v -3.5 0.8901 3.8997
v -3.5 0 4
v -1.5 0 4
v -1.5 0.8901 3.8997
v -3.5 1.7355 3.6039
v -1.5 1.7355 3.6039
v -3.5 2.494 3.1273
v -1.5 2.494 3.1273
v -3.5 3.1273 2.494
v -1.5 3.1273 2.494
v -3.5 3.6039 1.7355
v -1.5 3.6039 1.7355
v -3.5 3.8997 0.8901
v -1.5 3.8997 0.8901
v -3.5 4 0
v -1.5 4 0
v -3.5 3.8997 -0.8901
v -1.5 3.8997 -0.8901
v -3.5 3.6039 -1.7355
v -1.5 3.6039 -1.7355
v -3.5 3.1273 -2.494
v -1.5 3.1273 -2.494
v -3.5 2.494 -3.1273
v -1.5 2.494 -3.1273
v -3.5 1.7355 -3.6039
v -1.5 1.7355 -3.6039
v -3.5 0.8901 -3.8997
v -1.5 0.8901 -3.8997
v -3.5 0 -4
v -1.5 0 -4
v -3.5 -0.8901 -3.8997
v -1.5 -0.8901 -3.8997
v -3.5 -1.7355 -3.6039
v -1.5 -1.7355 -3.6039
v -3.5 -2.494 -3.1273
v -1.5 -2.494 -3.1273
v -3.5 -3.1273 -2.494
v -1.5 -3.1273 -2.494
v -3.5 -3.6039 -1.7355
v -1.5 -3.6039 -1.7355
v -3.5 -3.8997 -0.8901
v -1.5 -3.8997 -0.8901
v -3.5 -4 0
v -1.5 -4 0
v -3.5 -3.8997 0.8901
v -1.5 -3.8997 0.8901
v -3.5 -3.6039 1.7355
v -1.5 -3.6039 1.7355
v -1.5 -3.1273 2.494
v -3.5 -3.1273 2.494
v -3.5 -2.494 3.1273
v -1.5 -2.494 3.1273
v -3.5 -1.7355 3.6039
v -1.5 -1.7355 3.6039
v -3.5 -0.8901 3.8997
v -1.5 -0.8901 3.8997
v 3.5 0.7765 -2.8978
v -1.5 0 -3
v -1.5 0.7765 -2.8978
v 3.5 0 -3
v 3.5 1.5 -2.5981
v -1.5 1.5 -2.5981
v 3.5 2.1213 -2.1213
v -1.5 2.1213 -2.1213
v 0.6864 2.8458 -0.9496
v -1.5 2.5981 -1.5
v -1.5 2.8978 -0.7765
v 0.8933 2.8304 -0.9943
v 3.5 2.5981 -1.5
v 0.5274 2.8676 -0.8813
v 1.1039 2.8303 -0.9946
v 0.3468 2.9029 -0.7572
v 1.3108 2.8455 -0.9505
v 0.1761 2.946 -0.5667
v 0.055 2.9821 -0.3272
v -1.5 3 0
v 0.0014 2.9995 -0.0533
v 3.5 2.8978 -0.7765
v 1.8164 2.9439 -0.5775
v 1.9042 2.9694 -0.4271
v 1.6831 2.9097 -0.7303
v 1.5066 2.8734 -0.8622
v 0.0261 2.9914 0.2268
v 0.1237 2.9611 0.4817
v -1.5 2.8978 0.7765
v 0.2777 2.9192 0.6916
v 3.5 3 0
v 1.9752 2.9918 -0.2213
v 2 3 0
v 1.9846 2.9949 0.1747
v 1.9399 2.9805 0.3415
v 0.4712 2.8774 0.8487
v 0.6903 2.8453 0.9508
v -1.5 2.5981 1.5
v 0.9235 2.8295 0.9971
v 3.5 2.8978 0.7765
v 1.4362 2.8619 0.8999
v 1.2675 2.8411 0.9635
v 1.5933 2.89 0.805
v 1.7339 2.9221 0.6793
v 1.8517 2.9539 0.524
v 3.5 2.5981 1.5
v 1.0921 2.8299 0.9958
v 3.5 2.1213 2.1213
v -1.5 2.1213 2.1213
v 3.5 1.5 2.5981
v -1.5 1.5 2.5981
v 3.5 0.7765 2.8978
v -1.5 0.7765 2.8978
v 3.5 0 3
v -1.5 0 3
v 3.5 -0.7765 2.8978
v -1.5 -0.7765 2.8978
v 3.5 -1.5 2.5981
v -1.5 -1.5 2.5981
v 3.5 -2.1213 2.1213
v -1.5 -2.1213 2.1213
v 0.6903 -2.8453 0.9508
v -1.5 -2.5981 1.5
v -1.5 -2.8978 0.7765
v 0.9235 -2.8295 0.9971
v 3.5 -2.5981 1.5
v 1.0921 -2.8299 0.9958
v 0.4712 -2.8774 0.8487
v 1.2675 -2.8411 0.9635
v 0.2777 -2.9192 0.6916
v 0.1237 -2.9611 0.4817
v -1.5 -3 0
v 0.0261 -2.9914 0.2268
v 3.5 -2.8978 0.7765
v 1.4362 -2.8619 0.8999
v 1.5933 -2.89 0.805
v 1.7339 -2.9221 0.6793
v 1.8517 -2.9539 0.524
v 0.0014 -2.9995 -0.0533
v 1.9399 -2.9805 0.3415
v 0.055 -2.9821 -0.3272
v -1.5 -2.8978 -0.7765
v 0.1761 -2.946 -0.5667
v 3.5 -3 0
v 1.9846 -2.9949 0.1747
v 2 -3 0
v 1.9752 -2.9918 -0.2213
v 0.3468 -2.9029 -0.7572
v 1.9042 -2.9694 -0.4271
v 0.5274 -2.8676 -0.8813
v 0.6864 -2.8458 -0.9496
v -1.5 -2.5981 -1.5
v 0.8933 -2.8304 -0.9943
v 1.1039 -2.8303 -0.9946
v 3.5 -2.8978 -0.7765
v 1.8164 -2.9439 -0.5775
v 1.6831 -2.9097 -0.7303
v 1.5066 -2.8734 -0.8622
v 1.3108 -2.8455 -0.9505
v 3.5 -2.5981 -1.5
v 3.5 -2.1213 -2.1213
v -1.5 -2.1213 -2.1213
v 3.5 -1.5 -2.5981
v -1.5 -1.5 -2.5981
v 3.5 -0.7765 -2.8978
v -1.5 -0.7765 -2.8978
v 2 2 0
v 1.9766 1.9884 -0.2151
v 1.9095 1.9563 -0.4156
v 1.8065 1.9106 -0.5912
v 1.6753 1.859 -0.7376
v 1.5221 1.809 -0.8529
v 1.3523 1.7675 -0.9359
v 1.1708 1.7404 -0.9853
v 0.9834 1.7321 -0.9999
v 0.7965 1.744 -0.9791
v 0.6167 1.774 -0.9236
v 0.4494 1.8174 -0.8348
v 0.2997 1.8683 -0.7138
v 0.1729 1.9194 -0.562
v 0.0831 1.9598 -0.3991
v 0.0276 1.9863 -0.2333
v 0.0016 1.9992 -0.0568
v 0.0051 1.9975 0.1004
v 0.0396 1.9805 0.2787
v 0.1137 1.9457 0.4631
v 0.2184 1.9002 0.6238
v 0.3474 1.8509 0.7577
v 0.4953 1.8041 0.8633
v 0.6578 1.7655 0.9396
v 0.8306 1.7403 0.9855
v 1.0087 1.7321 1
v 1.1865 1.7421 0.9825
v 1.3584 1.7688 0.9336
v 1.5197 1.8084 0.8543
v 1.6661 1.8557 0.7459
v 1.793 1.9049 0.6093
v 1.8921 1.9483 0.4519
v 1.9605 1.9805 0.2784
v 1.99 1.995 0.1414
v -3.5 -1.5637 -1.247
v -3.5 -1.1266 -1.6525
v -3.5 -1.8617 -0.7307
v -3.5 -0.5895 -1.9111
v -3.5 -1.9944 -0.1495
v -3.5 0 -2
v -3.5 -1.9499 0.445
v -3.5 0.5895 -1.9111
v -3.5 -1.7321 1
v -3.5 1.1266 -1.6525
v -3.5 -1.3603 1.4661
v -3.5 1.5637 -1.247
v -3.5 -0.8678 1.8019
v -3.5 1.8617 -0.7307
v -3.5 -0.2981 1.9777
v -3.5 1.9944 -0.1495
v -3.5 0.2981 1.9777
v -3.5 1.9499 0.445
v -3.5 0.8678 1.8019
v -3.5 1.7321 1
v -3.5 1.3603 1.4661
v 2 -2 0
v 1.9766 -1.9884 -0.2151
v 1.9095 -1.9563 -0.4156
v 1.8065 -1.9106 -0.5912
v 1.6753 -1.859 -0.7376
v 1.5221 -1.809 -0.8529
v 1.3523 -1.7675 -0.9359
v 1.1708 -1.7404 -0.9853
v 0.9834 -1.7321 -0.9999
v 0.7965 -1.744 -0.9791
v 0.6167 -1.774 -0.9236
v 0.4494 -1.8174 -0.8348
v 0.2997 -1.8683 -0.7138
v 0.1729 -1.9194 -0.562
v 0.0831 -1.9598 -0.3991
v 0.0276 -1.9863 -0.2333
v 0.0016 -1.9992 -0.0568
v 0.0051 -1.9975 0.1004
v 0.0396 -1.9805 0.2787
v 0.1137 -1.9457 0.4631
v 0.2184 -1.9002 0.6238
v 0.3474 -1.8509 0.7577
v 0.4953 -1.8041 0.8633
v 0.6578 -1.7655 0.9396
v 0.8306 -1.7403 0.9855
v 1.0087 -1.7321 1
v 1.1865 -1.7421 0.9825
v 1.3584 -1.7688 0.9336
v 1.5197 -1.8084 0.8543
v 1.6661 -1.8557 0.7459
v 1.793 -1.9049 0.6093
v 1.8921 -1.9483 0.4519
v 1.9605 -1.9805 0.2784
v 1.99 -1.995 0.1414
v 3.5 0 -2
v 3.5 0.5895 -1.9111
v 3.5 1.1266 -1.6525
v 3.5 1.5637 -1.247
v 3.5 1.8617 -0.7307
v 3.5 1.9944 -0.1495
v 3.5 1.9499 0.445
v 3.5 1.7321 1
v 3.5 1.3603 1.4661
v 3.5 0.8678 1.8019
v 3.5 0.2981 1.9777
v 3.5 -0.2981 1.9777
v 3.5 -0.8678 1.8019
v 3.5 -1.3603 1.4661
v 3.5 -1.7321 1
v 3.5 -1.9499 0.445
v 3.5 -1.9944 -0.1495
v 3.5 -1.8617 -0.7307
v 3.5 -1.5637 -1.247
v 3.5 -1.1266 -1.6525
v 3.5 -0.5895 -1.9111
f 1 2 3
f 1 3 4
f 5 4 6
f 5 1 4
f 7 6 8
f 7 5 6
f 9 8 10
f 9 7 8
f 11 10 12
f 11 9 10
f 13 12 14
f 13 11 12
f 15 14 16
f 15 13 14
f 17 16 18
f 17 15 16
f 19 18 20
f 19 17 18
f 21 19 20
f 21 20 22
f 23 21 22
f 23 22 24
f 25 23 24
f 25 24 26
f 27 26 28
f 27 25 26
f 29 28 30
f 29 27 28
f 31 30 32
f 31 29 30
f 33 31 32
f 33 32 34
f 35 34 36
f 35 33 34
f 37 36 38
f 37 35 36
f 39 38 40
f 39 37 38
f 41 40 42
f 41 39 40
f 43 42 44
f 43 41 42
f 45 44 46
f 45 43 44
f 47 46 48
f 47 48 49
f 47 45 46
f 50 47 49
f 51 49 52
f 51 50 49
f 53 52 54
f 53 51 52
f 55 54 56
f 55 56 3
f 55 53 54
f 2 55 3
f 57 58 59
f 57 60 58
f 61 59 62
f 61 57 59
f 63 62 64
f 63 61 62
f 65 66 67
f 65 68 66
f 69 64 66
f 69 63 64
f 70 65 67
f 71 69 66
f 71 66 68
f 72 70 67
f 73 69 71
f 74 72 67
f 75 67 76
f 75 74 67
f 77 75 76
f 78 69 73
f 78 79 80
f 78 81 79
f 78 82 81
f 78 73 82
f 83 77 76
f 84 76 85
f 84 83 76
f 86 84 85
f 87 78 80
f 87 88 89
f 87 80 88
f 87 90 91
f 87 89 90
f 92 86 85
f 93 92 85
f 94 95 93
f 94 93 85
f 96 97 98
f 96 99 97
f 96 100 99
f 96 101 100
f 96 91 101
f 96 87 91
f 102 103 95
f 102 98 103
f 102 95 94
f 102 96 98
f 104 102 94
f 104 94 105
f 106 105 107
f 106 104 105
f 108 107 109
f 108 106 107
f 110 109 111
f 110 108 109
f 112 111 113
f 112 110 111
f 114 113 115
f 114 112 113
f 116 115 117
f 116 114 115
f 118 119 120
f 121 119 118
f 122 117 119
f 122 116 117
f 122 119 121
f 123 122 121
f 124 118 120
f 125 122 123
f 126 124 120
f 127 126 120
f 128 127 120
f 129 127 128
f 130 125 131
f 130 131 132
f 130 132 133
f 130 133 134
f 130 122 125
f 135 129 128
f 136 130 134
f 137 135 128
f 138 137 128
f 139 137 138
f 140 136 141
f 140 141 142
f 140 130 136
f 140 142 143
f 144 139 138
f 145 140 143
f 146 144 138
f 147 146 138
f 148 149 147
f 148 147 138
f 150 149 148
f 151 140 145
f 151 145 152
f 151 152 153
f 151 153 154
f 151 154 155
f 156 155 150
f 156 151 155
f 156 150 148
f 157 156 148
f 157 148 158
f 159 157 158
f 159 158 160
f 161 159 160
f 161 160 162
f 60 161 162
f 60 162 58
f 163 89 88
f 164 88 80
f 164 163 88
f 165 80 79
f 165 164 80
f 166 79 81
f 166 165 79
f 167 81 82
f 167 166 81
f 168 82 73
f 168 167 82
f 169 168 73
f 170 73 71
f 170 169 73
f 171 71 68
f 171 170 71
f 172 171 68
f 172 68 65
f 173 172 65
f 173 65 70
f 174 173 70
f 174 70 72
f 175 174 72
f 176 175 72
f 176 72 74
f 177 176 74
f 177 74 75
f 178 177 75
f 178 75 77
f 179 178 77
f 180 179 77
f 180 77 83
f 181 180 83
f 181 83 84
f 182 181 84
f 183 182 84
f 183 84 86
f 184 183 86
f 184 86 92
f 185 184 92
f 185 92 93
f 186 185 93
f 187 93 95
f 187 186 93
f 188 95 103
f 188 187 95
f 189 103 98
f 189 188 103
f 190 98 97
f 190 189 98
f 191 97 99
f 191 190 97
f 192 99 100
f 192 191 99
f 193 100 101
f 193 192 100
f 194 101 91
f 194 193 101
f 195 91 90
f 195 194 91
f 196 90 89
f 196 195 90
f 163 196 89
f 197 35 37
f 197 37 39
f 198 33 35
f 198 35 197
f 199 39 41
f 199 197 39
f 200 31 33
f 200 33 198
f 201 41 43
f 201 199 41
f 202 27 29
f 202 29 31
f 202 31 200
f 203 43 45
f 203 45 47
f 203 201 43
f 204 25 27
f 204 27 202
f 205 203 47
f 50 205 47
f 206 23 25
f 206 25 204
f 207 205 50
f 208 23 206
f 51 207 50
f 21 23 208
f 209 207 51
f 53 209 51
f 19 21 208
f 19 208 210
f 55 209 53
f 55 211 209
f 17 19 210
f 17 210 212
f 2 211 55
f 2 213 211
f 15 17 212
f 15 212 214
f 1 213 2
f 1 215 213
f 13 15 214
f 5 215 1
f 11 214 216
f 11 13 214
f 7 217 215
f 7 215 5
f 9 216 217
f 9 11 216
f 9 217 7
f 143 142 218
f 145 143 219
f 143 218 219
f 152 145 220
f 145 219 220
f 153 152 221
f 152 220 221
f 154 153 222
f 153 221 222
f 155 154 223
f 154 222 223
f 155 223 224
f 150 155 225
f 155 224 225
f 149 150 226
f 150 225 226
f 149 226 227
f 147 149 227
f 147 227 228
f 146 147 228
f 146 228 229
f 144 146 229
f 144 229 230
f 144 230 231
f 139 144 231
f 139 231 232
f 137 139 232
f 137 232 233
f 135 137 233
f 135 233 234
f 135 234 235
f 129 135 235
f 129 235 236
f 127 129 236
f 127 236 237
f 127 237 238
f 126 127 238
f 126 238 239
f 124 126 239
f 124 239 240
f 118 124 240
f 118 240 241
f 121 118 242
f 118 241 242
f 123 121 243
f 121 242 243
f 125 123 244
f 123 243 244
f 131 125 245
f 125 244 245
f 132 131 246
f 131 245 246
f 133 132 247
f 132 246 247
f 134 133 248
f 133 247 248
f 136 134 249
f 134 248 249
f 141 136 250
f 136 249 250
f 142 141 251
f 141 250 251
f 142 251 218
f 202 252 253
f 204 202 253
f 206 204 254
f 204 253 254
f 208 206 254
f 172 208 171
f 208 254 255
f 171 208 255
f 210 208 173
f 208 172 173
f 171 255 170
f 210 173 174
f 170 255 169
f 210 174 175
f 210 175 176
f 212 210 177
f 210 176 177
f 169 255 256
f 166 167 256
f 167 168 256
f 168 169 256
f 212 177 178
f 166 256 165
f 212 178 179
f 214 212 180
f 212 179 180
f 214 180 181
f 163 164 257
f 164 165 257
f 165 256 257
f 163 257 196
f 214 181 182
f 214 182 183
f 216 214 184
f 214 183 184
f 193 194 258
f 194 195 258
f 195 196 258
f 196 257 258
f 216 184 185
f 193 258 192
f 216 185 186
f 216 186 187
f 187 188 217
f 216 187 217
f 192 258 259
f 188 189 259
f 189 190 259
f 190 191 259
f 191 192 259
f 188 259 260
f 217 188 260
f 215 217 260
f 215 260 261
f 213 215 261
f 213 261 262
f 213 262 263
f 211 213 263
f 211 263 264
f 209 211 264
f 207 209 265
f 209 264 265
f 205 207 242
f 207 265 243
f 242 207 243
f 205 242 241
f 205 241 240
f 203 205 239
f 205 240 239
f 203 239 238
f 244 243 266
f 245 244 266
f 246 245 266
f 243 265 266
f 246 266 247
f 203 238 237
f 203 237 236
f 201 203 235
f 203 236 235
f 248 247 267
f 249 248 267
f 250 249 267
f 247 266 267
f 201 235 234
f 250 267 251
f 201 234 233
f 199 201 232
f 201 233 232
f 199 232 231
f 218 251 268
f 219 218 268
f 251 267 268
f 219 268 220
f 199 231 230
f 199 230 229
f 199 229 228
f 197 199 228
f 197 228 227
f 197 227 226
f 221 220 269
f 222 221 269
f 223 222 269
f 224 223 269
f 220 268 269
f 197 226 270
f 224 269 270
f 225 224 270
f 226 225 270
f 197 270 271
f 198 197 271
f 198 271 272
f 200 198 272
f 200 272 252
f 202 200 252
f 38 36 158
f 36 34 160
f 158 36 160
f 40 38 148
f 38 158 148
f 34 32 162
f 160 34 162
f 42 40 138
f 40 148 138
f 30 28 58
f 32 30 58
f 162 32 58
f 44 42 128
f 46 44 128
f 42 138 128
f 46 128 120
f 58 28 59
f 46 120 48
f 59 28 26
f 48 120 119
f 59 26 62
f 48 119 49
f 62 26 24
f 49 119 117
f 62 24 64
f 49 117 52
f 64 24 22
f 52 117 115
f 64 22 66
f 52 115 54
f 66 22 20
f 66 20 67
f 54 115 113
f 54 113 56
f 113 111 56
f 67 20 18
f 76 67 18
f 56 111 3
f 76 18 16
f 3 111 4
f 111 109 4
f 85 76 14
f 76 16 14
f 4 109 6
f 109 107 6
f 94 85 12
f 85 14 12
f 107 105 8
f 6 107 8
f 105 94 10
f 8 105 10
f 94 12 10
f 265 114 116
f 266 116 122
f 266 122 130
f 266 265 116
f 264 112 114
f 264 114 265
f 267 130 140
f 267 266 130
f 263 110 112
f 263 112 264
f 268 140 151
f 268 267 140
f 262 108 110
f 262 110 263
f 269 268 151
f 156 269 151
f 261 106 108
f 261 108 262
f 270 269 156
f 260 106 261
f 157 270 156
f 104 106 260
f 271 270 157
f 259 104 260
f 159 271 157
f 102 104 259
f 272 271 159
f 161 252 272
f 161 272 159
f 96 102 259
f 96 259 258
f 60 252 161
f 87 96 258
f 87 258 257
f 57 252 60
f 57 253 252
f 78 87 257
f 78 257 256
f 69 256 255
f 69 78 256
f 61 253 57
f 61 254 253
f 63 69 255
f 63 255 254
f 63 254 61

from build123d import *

# Parameters (mm, degrees)
SKETCH1_R               = 3
BOSS_EXTRUDE1_DEPTH     = 3.5
SKETCH2_R               = 4
BOSS_EXTRUDE2_DEPTH     = 2
SKETCH3_R               = 2
CUT_EXTRUDE1_DEPTH      = 8
SKETCH4_R               = 1
CUT_EXTRUDE2_DEPTH      = 5
CUT_EXTRUDE2_DEPTH_BACK = 5


with BuildPart() as part:
    # Sketch1 → Boss-Extrude1 (new body, symmetric)
    with BuildSketch(Plane(origin=(0, 0, 0), x_dir=(0, 0, -1), z_dir=(1, 0, 0))):
        Circle(SKETCH1_R)
    extrude(amount=BOSS_EXTRUDE1_DEPTH, both=True)

    # Sketch2 → Boss-Extrude2 (add)
    with BuildSketch(Plane.ZY.offset(3.5)):
        Circle(SKETCH2_R)
    extrude(amount=-BOSS_EXTRUDE2_DEPTH)

    # Sketch3 → Cut-Extrude1 (cut, through all)
    with BuildSketch(Plane(origin=(3.5, 0, 0), x_dir=(0, 0, -1), z_dir=(1, 0, 0))):
        Circle(SKETCH3_R)
    extrude(amount=-CUT_EXTRUDE1_DEPTH, mode=Mode.SUBTRACT)

    # Sketch4 → Cut-Extrude2 (cut, two sides)
    with BuildSketch(Plane(origin=(0, 0, 0), x_dir=(1, 0, 0), z_dir=(0, 1, 0))) as cut_extrude2_sk:
        with Locations((1, 0)):
            Circle(SKETCH4_R)
    extrude(amount=CUT_EXTRUDE2_DEPTH, mode=Mode.SUBTRACT)
    extrude(cut_extrude2_sk.sketch, amount=-CUT_EXTRUDE2_DEPTH_BACK, mode=Mode.SUBTRACT)


solid = part.part
